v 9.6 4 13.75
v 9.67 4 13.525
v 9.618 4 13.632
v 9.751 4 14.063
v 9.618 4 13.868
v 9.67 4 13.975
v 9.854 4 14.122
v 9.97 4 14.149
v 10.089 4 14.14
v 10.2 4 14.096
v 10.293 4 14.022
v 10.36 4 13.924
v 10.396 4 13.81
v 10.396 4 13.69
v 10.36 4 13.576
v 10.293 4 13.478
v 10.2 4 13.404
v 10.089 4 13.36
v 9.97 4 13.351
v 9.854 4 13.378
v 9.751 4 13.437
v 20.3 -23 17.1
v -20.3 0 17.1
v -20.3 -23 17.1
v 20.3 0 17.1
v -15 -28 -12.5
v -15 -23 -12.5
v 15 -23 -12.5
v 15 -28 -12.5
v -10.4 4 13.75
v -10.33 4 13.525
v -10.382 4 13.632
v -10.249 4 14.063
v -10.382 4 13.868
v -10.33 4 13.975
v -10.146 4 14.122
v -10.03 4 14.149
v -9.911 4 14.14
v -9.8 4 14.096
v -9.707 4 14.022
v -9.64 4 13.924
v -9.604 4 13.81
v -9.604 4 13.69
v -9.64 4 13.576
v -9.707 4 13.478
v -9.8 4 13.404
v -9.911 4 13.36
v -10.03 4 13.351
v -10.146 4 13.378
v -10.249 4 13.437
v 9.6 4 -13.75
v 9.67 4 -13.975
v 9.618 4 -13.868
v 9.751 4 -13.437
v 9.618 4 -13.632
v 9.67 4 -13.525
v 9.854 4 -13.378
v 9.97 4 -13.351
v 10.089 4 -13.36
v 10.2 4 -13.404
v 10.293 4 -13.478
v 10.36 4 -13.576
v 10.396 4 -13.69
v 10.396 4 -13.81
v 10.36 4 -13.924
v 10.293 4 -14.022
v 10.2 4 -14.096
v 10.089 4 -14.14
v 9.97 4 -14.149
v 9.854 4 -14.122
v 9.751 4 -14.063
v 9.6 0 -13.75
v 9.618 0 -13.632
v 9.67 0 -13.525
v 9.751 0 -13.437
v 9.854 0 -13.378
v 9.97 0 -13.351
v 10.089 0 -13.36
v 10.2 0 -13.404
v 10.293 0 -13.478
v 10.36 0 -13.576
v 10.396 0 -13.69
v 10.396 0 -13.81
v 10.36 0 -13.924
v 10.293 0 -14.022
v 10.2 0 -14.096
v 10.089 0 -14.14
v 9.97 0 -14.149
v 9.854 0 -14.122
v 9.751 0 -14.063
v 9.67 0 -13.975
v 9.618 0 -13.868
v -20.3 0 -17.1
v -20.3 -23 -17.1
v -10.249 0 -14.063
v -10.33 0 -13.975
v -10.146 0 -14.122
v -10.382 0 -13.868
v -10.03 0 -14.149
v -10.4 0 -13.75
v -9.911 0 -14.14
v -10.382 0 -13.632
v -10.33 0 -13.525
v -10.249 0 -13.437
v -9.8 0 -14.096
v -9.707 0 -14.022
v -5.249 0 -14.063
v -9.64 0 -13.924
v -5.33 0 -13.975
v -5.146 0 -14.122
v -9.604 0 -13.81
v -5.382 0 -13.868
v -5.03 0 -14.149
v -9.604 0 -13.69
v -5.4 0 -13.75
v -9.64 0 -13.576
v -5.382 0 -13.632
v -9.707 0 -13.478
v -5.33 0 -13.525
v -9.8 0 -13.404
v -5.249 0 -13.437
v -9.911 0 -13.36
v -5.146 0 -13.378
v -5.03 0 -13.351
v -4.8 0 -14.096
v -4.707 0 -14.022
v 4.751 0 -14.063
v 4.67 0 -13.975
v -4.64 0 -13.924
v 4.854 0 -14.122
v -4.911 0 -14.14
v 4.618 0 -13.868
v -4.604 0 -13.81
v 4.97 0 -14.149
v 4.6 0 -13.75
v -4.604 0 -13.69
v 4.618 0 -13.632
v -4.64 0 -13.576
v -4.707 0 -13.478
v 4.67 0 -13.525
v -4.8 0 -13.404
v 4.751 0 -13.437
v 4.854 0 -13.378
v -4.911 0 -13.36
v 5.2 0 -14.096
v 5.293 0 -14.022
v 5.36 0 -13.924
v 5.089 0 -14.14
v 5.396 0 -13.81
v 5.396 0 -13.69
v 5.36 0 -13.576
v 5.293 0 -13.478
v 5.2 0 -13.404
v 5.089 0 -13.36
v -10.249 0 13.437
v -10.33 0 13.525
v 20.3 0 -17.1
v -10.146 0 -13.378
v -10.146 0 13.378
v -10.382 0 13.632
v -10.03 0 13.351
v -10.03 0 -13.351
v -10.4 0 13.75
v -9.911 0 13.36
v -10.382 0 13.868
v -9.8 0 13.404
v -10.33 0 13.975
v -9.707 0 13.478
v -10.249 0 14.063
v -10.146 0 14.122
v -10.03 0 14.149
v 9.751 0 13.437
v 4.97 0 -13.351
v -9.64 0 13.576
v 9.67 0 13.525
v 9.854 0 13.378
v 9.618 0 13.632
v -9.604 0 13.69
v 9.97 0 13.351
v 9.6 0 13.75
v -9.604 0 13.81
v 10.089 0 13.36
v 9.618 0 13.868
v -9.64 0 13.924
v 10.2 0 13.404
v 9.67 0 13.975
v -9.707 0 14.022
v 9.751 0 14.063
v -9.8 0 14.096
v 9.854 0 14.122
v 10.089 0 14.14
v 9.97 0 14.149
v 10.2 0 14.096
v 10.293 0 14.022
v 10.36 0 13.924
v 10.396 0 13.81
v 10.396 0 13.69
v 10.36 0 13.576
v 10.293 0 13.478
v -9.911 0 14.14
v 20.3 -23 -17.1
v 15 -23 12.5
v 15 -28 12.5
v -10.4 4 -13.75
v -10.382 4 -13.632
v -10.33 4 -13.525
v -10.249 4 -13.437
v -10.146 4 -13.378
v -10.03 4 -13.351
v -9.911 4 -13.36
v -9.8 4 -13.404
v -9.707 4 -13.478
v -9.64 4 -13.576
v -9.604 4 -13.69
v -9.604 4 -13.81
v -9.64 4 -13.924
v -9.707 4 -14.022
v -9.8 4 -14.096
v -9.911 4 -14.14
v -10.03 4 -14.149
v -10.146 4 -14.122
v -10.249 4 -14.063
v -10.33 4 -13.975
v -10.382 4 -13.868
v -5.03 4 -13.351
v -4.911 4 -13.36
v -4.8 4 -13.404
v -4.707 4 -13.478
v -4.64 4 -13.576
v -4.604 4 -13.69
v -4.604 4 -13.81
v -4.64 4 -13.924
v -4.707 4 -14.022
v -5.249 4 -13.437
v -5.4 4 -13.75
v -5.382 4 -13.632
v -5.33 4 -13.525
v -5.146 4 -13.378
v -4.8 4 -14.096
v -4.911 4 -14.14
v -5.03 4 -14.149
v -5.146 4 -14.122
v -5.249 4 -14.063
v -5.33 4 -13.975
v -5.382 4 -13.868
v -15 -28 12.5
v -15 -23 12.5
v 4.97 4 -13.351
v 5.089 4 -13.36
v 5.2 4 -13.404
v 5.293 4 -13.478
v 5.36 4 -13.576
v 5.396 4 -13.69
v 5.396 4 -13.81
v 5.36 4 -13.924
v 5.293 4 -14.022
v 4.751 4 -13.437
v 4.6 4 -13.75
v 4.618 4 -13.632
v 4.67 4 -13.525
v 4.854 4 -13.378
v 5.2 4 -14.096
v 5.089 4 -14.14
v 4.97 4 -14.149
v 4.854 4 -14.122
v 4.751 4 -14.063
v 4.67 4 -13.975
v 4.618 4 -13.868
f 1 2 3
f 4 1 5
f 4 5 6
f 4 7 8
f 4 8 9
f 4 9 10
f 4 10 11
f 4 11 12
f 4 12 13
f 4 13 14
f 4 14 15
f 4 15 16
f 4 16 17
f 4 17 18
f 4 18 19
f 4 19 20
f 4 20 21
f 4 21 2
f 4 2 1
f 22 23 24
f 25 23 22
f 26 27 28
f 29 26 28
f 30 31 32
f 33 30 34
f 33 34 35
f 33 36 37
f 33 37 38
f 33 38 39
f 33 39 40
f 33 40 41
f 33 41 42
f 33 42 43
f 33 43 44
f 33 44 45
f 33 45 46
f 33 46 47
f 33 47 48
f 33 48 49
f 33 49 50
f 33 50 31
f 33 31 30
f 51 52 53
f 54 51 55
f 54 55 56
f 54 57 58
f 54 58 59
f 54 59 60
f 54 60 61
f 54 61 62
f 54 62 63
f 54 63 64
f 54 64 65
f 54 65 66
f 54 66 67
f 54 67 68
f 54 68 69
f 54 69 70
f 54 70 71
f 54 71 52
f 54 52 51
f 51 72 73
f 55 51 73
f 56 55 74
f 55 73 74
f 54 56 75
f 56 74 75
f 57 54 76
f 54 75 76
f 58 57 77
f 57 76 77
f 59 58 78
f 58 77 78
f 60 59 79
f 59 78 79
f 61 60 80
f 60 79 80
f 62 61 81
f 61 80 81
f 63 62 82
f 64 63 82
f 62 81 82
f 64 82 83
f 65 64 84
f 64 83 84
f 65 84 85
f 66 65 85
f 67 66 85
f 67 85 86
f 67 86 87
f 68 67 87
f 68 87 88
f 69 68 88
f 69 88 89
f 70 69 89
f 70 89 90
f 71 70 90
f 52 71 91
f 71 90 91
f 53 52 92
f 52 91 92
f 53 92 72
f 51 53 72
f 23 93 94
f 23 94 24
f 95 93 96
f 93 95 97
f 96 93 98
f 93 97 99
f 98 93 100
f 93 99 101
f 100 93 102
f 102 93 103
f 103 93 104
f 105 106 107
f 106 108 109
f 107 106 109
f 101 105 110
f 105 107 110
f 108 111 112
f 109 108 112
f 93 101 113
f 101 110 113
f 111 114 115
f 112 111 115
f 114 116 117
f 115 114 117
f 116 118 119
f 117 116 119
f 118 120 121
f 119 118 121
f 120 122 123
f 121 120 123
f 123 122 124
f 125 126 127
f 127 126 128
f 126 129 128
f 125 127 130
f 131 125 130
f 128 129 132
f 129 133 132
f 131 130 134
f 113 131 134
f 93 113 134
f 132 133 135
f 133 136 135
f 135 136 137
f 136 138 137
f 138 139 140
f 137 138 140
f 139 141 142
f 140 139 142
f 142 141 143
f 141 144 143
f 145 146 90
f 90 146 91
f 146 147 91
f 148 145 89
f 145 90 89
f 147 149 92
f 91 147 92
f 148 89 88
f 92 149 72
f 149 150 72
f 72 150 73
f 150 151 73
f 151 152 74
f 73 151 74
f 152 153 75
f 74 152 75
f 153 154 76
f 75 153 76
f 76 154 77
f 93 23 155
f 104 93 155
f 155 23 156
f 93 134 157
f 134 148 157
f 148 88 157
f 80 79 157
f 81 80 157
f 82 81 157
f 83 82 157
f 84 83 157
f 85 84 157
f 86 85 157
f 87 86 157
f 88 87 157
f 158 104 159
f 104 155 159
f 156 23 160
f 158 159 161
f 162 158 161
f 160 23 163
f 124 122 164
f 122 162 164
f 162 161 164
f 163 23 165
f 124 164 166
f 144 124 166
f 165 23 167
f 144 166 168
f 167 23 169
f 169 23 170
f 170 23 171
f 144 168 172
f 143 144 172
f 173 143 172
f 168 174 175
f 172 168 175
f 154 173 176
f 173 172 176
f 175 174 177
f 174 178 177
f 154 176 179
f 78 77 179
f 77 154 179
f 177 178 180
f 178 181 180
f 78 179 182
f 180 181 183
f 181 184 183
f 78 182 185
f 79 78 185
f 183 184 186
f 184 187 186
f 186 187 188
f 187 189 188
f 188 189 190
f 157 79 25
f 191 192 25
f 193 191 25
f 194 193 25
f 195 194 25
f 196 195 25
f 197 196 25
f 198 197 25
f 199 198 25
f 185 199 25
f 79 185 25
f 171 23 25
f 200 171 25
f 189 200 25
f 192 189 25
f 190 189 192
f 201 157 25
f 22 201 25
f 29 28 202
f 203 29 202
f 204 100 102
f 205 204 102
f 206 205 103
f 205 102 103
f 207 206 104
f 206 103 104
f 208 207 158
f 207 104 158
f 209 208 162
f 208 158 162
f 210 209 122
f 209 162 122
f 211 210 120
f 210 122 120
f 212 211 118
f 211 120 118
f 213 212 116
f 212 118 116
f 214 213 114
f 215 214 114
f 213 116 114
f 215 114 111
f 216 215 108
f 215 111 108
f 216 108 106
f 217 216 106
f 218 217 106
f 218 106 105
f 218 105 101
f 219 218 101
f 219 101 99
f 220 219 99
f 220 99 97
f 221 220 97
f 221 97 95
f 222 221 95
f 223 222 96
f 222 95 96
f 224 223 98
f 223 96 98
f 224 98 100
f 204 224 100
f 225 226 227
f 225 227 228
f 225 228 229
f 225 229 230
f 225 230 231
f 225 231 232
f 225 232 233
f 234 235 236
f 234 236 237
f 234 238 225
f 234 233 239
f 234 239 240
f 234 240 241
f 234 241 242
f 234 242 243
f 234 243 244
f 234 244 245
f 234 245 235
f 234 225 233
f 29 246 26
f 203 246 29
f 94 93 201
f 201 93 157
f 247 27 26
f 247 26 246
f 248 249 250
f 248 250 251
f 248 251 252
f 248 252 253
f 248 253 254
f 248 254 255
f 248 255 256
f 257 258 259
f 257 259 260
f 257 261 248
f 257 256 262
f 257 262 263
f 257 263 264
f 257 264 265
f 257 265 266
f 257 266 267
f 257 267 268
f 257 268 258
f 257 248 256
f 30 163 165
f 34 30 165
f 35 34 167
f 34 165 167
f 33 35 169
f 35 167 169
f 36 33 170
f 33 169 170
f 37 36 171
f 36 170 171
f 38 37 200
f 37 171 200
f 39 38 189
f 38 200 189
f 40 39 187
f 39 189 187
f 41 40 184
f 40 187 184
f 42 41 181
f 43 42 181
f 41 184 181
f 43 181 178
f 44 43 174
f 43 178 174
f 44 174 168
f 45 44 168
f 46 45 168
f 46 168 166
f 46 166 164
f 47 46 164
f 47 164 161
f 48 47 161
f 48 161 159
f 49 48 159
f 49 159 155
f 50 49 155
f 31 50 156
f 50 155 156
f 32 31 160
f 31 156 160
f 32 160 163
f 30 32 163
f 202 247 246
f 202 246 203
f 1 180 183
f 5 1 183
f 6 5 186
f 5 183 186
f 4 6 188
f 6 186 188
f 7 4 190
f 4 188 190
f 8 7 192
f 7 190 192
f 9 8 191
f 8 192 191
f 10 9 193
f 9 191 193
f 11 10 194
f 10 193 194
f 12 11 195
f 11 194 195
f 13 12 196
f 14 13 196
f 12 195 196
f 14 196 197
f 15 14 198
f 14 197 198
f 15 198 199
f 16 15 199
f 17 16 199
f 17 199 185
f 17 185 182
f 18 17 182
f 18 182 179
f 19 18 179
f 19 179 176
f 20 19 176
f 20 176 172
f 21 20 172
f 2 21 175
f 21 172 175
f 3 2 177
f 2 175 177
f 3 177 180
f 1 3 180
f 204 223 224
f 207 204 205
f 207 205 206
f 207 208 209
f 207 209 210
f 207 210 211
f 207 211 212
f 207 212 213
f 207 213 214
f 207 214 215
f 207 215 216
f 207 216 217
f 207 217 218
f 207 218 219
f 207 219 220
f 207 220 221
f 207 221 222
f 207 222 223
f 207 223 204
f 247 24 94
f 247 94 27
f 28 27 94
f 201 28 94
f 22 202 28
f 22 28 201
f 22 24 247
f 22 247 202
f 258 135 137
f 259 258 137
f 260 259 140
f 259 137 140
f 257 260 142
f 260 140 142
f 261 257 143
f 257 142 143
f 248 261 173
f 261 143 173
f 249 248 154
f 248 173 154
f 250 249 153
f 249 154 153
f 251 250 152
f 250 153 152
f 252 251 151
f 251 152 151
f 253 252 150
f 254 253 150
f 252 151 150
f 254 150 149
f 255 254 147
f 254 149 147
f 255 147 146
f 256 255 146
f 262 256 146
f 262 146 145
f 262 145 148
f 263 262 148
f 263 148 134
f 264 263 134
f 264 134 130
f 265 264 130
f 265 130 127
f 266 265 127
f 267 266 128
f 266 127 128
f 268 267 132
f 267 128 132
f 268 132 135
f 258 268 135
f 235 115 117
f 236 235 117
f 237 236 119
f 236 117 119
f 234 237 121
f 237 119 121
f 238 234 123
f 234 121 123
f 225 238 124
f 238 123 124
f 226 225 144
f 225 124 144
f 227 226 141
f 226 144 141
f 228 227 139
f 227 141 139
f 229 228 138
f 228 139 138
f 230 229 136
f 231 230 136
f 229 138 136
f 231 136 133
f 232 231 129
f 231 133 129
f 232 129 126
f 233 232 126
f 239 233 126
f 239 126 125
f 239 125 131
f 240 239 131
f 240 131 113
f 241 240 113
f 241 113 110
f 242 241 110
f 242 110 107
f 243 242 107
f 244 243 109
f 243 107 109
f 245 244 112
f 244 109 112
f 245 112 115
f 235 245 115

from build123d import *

# Parameters (mm, degrees)
F0_W     = 40.6
F0_H     = 34.2
F1_DEPTH = 23
F2_W     = 30
F2_H     = 25
F3_DEPTH = 5
F4_R     = 0.4
F5_DEPTH = 4


with BuildPart() as f1:
    # F0 (on Front) → F1 (new body)
    with BuildSketch(Plane.XZ):
        Rectangle(F0_W, F0_H)
    extrude(amount=F1_DEPTH)

    # F2 (on face) → F3 (join)
    with BuildSketch(Plane.XZ.offset(23)):
        Rectangle(F2_W, F2_H)
    extrude(amount=F3_DEPTH)

    # F4 (on face) → F5 (join)
    with BuildSketch(Plane(origin=(0, 0, 0), x_dir=(-1, 0, 0), z_dir=(0, 1, 0))):
        with Locations((10, 13.75)):
            Circle(F4_R)
        with Locations((-10, 13.75)):
            Circle(F4_R)
        with Locations((-10, -13.75)):
            Circle(F4_R)
        with Locations((-5, -13.75)):
            Circle(F4_R)
        with Locations((10, -13.75)):
            Circle(F4_R)
        with Locations((5, -13.75)):
            Circle(F4_R)
    extrude(amount=F5_DEPTH)


solid = f1.part
